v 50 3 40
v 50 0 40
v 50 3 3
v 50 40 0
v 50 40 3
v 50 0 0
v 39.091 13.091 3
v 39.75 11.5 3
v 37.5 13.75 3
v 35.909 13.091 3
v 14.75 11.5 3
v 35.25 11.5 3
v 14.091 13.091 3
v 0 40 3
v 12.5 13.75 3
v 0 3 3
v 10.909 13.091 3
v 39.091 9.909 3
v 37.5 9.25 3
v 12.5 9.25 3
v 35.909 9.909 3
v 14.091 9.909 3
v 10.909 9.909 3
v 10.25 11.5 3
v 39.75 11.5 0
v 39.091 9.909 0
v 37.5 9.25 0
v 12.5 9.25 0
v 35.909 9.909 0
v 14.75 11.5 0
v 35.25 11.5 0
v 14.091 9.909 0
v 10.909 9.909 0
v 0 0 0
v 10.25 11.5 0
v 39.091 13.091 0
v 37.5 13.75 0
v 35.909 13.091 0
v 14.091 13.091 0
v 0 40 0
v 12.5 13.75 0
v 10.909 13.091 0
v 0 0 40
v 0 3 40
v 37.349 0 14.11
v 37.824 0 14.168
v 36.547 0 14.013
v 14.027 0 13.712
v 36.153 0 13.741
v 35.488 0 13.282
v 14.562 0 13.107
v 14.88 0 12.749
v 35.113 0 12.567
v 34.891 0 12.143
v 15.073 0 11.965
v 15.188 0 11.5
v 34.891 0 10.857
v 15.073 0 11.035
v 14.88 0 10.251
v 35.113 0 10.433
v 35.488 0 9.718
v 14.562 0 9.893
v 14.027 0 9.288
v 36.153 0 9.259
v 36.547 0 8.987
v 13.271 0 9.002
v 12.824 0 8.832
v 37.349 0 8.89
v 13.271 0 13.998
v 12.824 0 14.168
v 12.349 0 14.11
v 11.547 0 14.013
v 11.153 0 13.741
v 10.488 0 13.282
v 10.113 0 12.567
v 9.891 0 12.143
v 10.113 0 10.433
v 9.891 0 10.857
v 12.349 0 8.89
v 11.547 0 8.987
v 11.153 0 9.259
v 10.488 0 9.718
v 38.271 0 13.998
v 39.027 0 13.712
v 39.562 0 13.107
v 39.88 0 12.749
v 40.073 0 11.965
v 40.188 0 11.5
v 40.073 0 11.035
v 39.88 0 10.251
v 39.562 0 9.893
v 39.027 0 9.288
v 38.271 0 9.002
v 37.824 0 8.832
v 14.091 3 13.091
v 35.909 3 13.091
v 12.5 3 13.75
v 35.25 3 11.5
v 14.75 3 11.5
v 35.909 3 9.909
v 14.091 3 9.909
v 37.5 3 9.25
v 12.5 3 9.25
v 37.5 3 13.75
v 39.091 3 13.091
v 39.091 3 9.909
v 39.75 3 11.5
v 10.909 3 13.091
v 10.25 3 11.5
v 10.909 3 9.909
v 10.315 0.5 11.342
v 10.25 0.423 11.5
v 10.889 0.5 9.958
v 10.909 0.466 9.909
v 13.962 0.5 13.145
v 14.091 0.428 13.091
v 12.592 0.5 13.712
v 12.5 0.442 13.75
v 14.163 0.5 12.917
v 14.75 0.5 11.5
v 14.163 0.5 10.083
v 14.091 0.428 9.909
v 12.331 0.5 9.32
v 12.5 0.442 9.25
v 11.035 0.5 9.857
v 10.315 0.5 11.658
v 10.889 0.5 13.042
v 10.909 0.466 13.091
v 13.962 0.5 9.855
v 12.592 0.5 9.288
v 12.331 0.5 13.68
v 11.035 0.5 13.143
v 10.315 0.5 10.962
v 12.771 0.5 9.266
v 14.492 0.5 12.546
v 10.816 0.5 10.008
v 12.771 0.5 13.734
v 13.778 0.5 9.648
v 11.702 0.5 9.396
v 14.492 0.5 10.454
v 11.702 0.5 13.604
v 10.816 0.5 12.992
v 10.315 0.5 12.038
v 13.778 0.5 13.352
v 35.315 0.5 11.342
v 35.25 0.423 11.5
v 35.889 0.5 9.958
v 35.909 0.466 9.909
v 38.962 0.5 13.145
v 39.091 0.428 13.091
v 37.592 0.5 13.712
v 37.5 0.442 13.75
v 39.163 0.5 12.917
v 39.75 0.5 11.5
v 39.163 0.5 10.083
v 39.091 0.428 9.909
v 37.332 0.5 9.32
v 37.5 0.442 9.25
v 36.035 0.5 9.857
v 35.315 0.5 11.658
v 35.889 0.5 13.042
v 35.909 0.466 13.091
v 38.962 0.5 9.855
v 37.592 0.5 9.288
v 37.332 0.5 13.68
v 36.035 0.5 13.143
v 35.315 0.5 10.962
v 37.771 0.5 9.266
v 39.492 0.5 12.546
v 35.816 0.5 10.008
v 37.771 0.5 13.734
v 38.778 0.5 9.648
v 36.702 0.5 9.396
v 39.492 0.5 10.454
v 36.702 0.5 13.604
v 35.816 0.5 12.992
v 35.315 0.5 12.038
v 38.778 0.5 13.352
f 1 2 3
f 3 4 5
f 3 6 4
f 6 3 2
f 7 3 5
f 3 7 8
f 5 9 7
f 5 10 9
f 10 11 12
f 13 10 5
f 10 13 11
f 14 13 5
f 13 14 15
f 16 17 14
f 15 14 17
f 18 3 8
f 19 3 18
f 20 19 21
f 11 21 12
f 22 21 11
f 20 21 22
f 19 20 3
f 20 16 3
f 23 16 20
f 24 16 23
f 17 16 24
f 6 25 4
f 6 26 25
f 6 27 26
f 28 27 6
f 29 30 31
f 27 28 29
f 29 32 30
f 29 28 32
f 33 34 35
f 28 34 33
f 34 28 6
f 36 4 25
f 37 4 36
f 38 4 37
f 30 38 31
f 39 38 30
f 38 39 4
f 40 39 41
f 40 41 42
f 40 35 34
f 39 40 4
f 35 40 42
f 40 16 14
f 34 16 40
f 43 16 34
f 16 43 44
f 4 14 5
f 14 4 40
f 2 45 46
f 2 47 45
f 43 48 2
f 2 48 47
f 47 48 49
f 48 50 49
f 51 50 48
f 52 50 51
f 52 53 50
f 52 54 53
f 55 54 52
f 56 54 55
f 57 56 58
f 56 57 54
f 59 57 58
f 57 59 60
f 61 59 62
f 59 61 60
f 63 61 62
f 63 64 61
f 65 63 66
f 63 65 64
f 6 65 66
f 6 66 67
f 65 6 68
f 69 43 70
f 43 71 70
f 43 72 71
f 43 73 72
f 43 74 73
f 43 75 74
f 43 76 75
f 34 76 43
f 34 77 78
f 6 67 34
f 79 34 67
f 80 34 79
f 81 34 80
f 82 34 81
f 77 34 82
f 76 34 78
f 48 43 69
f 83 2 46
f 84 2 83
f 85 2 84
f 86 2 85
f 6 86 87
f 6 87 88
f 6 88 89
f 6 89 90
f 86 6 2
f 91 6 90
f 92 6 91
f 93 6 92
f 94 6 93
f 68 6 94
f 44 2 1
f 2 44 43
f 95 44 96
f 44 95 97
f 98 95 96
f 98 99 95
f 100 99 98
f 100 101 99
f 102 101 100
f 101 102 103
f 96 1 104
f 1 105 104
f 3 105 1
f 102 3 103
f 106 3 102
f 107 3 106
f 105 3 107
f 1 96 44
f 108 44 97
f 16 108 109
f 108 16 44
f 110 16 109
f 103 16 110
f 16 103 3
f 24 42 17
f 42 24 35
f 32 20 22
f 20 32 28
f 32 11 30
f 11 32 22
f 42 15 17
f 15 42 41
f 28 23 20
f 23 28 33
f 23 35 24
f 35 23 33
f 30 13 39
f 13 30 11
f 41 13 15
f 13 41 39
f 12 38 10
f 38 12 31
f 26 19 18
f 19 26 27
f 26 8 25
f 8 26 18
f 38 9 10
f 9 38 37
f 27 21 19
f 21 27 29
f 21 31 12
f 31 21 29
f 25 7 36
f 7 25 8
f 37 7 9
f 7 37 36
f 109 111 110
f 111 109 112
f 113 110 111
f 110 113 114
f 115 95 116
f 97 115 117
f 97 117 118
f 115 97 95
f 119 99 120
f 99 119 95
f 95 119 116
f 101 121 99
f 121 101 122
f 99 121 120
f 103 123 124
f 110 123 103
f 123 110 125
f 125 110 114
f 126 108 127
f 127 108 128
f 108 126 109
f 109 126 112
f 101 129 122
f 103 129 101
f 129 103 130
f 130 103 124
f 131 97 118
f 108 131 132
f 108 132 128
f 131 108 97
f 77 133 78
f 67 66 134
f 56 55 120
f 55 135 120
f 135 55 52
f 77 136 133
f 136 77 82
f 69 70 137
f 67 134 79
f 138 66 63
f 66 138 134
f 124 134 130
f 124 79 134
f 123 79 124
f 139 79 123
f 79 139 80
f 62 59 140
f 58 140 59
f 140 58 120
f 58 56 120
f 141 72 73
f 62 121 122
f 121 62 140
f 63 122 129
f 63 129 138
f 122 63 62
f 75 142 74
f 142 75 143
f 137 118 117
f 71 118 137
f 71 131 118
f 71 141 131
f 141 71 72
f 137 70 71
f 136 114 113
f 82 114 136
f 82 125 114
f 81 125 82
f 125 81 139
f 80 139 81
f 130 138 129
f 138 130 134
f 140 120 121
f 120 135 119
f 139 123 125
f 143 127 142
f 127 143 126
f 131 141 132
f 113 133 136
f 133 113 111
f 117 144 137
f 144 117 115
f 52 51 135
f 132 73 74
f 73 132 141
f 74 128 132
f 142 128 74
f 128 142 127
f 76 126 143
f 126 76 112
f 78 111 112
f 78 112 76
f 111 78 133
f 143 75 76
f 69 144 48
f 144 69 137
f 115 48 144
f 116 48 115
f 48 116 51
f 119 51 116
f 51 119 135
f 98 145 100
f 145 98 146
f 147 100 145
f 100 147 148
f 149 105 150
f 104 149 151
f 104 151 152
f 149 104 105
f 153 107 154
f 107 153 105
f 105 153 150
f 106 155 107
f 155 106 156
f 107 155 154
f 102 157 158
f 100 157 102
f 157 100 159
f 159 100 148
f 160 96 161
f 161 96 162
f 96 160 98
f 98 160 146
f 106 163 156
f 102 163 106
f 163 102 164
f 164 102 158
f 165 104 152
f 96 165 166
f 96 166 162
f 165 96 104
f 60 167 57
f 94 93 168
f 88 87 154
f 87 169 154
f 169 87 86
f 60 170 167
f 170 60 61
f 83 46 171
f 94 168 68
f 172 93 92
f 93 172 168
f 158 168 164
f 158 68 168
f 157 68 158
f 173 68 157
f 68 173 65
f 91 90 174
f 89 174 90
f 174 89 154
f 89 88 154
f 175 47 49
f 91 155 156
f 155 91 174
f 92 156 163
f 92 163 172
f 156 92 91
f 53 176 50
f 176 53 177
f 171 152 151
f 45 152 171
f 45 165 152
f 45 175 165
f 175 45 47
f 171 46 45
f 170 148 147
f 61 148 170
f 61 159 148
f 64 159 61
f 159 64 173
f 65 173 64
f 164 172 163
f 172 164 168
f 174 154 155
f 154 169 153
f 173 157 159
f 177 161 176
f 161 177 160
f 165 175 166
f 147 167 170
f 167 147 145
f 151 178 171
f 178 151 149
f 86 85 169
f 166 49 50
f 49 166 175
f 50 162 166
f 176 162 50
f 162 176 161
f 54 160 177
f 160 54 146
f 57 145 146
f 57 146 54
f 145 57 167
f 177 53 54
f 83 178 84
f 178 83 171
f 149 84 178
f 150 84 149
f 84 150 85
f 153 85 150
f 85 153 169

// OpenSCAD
// パラメータ設定
width = 50;
depth = 40;
height = 40;
thickness = 3;

// ねじ穴設定
hole_dia = 4.5;
cs_dia = 8.0;
cs_depth = 2.0;

module countersunk_hole(is_vertical = false) {
    union() {
        // 貫通穴
        cylinder(d = hole_dia, h = thickness * 3, center = true);
        // 皿座面（外側の面に向けて配置）
        translate([0, 0, is_vertical ? -thickness / 2 + cs_depth / 2 : thickness / 2 - cs_depth / 2])
            cylinder(d1 = hole_dia, d2 = cs_dia, h = cs_depth);
    }
}

difference() {
    // L字金具の本体
    union() {
        // 水平面 (Y+方向に伸びる)
        cube([width, depth, thickness]);
        // 垂直面 (Z+方向に伸びる)
        cube([width, thickness, height]);
    }

    // 水平面の穴 (Y方向に10mm内側、X方向に左右対称)
    // 皿座面は下面(Z-)へ向ける
    for (x = [12.5, 37.5]) {
        translate([x, 10 + thickness / 2, 0])
            rotate([180, 0, 0])
                countersunk_hole(false);
    }

    // 垂直面の穴 (Z方向に10mm内側、X方向に左右対称)
    // 皿座面は背面(Y-)へ向ける
    for (x = [12.5, 37.5]) {
        translate([x, 0, 10 + thickness / 2])
            rotate([90, 0, 0])
                countersunk_hole(true);
    }
}
